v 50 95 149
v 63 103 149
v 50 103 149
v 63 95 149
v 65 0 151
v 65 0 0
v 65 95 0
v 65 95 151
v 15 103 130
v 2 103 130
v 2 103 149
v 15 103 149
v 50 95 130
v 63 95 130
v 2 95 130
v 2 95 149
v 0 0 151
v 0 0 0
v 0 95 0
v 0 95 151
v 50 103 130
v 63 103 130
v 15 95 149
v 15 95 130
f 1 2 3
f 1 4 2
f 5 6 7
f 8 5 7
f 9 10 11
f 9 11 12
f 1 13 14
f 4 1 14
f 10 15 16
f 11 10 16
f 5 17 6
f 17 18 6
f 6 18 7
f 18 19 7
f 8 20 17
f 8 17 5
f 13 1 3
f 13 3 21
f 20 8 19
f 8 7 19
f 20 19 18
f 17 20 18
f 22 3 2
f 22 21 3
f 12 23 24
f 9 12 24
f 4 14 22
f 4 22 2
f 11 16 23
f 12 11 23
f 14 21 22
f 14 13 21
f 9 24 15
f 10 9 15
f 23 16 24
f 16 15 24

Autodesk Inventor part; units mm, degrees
ref_plane "YZ Plane" through (0, 0, 0) normal (1, 0, 0) x (0, 1, 0)
ref_plane "XZ Plane" through (0, 0, 0) normal (0, 1, 0) x (-1, 0, 0)
ref_plane "XY Plane" through (0, 0, 0) normal (0, 0, 1) x (1, 0, 0)
sketch "Sketch1" plane through (0, 0, 0) normal (0, 0, 1) x (1, 0, 0)
  line L0 (0, 0) -> (65, 0)
  line L1 (65, 0) -> (65, 95)
  line L2 (65, 95) -> (0, 95)
  line L3 (0, 95) -> (0, 0)
  dimension "d0" = 95
  dimension "d1" = 65
extrude "Extrusion1" add sketch "Sketch1" along normal blind 151
sketch "Sketch2" plane through (0, 95, 0) normal (0, 1, 0) x (1, 0, 0)
  line L0 (2, -149) -> (15, -149)
  line L1 (15, -149) -> (15, -130)
  line L2 (15, -130) -> (2, -130)
  line L3 (2, -130) -> (2, -149)
  line L4 (0, -151) -> (65, -151) projected
  line L5 (0, 0) -> (0, -151) projected
  dimension "d6" = 2
  dimension "d7" = 19
  dimension "d8" = 13
  dimension "d9" = 2
extrude "Extrusion2" add sketch "Sketch2" along normal blind 8 separate body
sketch "Sketch3" plane through (0, 95, 0) normal (0, 1, 0) x (1, 0, 0)
  line L0 (0, -151) -> (65, -151) projected
  line L1 (65, 0) -> (65, -151) projected
  line L2 (63, -149) -> (50, -149)
  line L3 (50, -149) -> (50, -130)
  line L4 (50, -130) -> (63, -130)
  line L5 (63, -130) -> (63, -149)
  dimension "d10" = 19
  dimension "d11" = 13
  dimension "d12" = 2
  dimension "d13" = 2
extrude "Extrusion3" add sketch "Sketch3" along normal blind 8 separate body
properties part number "TB1272-Battery"
